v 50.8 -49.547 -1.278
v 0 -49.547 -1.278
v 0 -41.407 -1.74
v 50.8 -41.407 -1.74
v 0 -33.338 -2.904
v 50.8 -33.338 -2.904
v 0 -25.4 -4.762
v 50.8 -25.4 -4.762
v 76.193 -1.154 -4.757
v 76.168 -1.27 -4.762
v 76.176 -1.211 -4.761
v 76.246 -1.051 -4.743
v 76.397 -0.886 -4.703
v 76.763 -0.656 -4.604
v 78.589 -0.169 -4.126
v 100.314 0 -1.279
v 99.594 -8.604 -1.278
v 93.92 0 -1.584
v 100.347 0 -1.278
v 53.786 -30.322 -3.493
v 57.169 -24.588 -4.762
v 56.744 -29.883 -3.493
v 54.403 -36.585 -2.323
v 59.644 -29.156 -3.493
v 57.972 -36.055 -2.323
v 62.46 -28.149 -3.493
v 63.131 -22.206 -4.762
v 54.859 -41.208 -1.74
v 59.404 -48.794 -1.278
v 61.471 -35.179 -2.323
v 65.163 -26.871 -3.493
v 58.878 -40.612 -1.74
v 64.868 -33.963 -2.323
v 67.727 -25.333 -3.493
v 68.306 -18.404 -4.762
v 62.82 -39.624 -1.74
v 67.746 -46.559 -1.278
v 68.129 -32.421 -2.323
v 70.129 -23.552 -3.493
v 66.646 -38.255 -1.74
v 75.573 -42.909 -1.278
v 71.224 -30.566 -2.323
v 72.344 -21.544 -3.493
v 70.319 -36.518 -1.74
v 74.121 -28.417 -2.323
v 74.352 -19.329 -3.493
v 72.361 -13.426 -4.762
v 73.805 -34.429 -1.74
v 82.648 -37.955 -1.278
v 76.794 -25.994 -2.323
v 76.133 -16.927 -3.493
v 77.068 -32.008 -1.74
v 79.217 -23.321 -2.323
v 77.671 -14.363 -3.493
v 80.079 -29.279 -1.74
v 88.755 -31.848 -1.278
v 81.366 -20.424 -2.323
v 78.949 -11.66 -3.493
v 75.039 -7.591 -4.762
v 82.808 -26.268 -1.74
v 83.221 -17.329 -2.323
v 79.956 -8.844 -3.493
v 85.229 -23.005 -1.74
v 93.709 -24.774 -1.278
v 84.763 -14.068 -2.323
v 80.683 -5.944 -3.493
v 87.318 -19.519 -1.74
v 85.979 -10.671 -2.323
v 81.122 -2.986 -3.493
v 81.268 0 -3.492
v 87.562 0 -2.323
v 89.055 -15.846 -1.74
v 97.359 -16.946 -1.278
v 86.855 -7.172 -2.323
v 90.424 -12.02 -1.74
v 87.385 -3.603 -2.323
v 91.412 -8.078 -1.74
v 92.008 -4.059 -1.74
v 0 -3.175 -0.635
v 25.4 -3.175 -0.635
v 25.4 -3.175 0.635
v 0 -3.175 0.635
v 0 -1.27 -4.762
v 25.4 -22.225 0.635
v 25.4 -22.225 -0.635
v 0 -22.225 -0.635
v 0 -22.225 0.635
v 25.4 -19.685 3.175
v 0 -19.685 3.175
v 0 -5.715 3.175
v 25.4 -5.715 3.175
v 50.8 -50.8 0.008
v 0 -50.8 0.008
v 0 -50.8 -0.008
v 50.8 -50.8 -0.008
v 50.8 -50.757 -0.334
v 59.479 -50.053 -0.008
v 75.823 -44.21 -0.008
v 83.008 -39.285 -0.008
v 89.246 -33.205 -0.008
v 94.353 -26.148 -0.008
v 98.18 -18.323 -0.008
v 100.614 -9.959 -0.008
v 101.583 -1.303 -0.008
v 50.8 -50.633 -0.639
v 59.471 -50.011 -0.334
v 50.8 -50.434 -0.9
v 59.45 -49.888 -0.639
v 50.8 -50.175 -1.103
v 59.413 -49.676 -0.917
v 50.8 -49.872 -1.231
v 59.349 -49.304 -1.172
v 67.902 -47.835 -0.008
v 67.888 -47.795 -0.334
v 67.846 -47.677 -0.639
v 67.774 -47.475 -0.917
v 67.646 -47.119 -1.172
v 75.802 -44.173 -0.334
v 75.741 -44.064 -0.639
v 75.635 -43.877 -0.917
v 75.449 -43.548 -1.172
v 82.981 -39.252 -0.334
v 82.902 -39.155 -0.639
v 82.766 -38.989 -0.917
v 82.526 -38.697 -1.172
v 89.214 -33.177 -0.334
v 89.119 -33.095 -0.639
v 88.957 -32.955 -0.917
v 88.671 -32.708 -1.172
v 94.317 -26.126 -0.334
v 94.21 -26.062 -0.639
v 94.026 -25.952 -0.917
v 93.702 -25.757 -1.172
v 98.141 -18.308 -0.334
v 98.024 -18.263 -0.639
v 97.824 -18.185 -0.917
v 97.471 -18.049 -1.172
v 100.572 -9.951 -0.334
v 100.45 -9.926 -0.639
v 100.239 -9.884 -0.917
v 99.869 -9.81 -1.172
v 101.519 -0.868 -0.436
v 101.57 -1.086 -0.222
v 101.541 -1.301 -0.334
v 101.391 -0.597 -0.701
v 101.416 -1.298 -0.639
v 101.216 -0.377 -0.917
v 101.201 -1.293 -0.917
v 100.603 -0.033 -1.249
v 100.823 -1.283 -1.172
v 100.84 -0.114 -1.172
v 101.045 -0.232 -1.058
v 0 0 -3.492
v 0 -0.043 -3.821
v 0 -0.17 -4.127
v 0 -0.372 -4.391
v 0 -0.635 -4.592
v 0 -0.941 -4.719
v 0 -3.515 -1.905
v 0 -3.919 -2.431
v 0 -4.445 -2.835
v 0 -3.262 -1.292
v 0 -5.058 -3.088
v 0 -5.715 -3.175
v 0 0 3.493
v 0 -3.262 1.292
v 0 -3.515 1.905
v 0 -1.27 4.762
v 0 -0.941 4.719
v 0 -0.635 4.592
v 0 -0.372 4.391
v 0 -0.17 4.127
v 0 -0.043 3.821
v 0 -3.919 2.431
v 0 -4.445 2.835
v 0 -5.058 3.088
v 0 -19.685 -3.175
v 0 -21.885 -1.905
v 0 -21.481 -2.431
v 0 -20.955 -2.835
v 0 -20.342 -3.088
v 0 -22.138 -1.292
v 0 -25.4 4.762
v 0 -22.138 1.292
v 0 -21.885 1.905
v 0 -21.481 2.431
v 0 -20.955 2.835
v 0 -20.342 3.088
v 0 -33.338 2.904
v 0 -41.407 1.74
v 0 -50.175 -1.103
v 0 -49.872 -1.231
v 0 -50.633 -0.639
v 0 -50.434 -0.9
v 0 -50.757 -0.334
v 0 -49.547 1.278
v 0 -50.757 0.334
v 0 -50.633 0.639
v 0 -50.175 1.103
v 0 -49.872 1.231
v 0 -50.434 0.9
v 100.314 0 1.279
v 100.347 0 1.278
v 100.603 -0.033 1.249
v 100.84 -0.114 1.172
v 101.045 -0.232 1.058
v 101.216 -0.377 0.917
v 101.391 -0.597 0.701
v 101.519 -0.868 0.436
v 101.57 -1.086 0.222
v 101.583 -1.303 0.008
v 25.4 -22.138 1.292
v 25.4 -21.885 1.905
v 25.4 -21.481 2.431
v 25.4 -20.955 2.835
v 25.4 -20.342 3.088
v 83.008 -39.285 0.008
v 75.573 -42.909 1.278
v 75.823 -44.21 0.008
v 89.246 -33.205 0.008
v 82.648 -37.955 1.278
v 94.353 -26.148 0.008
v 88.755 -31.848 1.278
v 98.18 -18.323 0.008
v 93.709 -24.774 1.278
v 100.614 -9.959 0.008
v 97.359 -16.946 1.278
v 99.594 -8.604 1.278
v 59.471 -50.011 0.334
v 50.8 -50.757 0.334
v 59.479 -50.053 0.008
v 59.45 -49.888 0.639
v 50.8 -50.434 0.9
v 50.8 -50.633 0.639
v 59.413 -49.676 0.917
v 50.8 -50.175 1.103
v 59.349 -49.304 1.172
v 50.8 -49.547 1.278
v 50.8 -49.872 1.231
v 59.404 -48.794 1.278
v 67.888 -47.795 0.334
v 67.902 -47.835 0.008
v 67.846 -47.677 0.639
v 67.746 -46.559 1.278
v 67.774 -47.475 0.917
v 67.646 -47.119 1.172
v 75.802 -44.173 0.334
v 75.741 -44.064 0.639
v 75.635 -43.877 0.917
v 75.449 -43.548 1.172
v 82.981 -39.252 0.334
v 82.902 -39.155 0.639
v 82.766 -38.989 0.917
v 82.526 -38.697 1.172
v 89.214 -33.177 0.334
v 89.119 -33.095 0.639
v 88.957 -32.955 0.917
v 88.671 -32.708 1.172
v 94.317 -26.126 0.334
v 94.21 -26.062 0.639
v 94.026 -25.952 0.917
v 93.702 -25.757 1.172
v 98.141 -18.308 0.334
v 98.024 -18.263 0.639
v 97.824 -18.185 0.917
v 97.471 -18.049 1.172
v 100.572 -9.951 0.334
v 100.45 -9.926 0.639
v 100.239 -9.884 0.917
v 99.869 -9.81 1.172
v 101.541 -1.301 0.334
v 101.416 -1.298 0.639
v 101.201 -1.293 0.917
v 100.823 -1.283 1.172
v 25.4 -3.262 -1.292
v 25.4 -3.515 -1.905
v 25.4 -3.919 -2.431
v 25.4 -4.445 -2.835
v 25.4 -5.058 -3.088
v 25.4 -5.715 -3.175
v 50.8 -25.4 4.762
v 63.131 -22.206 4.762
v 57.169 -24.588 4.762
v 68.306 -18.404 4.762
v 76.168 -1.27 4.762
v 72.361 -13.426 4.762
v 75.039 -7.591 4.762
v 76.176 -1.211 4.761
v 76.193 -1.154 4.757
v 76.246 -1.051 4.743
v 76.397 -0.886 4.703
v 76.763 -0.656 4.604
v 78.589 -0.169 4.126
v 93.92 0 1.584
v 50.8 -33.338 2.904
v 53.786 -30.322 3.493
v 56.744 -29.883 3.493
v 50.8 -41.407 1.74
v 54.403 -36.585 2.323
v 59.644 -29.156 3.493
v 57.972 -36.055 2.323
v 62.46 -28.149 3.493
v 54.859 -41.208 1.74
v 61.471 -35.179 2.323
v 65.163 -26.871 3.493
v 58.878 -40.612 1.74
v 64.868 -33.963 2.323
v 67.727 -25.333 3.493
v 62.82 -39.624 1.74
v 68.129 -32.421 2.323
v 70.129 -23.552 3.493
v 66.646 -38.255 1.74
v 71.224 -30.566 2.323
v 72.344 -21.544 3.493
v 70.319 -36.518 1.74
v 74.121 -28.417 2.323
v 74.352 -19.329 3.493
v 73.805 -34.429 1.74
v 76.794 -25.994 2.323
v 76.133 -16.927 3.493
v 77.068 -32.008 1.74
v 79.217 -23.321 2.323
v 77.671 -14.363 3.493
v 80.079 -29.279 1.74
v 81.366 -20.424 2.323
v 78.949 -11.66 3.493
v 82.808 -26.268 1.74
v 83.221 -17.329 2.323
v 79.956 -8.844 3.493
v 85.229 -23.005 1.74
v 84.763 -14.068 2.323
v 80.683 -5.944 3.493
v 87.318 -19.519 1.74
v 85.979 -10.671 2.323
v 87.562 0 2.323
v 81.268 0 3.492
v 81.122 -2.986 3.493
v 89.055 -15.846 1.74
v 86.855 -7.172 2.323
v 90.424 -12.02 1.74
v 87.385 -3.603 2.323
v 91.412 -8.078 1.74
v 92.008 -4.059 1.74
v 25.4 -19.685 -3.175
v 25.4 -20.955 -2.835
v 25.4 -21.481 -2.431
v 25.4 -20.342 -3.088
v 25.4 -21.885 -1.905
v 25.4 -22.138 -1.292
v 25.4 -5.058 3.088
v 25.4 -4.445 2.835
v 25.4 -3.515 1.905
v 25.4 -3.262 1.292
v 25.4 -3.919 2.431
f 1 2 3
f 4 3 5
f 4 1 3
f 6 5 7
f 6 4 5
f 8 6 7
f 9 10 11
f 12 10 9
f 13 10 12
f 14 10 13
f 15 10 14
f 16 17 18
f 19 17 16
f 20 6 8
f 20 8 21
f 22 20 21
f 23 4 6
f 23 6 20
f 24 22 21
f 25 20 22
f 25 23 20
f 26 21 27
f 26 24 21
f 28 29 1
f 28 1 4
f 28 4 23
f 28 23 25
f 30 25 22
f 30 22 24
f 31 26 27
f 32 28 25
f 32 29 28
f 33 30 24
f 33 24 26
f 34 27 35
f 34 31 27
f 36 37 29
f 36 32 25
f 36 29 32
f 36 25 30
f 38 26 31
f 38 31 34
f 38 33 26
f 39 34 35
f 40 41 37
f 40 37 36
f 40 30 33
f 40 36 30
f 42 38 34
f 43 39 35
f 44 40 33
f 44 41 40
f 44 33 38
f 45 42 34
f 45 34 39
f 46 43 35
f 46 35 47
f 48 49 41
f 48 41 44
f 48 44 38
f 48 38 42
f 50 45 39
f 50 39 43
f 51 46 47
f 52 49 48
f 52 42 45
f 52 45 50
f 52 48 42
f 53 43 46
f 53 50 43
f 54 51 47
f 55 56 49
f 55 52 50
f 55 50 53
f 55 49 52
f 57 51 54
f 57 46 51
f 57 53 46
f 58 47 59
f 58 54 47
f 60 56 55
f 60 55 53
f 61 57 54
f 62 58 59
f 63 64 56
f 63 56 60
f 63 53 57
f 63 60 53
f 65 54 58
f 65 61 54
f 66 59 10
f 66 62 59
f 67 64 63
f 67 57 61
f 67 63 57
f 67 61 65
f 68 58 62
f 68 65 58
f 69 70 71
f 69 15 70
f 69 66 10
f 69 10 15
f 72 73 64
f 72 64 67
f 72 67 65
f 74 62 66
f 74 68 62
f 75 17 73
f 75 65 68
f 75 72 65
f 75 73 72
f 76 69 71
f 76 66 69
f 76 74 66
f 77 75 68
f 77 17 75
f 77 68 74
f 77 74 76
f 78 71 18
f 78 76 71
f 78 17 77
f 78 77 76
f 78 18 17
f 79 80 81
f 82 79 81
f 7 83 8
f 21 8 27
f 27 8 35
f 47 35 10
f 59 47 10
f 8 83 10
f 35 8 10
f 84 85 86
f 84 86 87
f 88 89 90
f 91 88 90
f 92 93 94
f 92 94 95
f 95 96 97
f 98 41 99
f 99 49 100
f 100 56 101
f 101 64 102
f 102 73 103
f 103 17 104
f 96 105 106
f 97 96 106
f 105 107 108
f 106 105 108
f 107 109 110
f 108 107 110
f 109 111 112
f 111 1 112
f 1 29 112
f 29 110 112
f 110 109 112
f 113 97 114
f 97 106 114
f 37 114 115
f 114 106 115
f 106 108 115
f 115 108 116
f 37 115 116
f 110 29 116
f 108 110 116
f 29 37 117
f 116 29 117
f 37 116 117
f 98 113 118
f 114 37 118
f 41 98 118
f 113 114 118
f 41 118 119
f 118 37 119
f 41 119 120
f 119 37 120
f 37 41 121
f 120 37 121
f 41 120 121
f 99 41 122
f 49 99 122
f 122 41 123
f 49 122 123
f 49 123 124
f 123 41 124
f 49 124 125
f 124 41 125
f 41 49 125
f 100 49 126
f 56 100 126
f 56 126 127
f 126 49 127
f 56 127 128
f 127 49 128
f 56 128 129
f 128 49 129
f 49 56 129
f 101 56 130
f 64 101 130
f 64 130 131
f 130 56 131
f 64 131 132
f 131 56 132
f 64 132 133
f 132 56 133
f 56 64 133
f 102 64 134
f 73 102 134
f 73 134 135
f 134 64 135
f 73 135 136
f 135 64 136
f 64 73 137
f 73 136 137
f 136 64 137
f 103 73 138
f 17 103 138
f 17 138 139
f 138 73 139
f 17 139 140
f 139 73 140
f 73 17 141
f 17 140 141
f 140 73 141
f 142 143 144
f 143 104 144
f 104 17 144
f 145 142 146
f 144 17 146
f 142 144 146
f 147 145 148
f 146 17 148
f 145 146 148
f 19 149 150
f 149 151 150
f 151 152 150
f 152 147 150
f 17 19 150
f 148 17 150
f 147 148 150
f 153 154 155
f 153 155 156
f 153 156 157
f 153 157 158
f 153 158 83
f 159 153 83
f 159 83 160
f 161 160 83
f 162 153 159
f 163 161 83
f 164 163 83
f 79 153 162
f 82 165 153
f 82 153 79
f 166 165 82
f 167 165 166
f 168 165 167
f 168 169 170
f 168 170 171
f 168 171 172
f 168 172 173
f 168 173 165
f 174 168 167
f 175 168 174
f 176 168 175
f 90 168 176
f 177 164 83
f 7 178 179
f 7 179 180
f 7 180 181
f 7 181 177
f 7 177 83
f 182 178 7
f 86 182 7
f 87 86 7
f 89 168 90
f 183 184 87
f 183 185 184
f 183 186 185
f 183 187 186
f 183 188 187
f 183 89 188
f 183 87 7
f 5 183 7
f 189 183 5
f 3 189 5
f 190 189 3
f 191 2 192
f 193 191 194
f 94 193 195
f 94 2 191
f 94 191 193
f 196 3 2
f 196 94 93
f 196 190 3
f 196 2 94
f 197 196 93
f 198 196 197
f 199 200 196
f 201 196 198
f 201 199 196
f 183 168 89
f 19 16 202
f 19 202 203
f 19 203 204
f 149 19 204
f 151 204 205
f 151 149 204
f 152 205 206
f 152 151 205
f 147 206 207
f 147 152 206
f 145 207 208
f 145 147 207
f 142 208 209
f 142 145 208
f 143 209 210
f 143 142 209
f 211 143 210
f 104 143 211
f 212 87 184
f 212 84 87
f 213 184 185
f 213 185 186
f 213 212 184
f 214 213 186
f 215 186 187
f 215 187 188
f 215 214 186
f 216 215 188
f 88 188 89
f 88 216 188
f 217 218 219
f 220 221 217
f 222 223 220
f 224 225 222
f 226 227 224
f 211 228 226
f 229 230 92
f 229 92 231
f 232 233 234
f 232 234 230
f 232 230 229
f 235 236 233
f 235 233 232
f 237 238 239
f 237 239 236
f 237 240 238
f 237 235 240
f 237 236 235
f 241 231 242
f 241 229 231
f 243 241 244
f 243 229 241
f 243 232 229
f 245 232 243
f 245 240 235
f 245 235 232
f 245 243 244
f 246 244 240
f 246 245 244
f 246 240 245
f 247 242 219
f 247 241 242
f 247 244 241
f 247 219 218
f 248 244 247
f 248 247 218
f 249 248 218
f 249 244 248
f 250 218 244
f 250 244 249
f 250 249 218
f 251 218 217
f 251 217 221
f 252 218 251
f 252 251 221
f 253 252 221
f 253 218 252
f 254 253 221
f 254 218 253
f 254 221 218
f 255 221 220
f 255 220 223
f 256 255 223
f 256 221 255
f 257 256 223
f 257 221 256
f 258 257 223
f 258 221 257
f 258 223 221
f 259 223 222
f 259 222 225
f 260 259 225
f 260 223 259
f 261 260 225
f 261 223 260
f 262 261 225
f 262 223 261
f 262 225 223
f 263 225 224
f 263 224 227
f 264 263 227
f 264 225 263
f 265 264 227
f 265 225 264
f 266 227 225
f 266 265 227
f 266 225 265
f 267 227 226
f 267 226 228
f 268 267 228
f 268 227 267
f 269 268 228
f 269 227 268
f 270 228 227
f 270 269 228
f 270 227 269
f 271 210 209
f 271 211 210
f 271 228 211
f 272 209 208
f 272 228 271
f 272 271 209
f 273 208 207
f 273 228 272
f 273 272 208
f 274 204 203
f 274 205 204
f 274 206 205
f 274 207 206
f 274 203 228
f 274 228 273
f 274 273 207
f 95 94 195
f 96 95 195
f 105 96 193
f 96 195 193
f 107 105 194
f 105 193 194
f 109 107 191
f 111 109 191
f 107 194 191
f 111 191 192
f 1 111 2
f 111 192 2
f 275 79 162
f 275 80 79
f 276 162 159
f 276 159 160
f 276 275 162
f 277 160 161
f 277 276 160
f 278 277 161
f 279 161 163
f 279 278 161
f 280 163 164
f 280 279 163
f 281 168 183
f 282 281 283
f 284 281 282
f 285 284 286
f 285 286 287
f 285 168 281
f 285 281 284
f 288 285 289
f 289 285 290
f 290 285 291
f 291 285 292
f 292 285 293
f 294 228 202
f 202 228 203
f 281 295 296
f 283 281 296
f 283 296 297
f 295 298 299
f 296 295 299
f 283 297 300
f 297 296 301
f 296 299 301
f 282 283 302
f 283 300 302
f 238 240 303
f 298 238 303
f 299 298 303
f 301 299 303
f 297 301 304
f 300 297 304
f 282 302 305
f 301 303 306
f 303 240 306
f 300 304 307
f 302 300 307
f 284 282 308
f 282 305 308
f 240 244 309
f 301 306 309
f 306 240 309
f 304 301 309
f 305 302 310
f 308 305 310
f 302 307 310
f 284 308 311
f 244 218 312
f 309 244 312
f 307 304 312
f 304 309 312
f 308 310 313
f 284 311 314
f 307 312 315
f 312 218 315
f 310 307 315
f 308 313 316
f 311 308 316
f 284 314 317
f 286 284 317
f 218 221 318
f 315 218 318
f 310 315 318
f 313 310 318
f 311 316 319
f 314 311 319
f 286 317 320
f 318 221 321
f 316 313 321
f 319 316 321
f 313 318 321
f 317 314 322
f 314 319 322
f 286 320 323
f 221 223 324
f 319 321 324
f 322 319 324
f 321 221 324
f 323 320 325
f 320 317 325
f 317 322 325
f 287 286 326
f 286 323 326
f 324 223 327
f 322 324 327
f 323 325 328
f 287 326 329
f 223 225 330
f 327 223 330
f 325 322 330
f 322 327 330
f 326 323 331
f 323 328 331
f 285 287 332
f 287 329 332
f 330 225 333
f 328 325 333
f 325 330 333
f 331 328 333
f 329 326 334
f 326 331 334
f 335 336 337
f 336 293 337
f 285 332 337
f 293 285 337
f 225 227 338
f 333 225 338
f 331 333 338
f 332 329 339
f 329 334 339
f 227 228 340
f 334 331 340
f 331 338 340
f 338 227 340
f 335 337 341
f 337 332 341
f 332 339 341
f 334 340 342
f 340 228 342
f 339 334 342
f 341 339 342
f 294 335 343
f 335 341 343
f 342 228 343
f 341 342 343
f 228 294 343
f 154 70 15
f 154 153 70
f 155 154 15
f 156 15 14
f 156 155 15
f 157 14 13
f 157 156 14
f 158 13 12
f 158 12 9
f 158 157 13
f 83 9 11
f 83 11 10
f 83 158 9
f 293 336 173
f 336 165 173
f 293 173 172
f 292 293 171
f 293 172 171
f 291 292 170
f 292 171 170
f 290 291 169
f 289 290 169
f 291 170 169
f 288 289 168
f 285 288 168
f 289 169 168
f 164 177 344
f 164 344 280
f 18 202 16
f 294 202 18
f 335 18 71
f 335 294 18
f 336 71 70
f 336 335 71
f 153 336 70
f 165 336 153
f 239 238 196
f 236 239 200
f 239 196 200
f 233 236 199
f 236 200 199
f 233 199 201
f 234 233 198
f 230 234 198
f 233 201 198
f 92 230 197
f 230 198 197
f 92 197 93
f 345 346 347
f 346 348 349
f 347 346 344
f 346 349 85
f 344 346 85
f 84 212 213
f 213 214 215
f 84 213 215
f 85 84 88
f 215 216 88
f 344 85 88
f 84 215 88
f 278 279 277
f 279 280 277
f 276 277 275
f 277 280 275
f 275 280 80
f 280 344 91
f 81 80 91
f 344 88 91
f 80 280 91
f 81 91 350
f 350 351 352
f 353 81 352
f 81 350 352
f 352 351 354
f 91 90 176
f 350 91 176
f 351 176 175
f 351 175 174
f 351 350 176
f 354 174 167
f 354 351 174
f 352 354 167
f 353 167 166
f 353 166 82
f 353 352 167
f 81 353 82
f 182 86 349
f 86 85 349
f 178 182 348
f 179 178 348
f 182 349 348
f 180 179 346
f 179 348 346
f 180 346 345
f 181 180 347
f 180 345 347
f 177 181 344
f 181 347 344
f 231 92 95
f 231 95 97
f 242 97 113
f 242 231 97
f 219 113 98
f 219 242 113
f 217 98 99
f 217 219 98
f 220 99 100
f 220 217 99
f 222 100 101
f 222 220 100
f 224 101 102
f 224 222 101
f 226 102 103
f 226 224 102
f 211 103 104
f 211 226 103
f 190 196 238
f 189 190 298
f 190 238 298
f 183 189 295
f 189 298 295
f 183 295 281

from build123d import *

# Parameters (mm, degrees)
F1_DEPTH     = 4.7625
F2_W         = 19.05
F2_H         = 6.35
F3_DEPTH     = 25.4
F4_R         = 2.54
F9_T1_DEPTH  = 9.0533559085
F9_T3_DEPTH  = 84.7725
F9_T5_DEPTH  = 53.9538612207
F9_T8_ANGLE  = 93.5585733653
F9_T10_ANGLE = 93.5585733653


# Not quite as in the source:
# - a fillet or chamfer that OpenCascade refuses, or shapes differently, is made with other operations: its cross-section is extruded or revolved along the edge and cut away or added
# - two fillets or chamfers of one size are made in one step


with BuildPart() as f1:
    # F0 (on Top) → F1 (new body, symmetric)
    with BuildSketch(Plane.XY):
        with BuildLine():
            Line((101.6, 0), (0, 0))
            Line((0, 0), (0, -50.8))
            Line((0, -50.8), (50.8, -50.8))
            ThreePointArc((50.8, -50.8), (86.7210244843, -35.9210244843), (101.6, 0))
        make_face()
    extrude(amount=F1_DEPTH, both=True)

    # F2 (on Right) → F3 (cut)
    with BuildSketch(Plane.YZ):
        with Locations((-12.7, 0)):
            Rectangle(F2_W, F2_H)
    extrude(amount=F3_DEPTH, mode=Mode.SUBTRACT)

    # F4
    f4_edges = [f1.edges().sort_by_distance(p)[0] for p in [
        (12.7, -3.175, -3.175),
        (12.7, -3.175, 3.175),
        (12.7, -22.225, -3.175),
        (12.7, -22.225, 3.175),
    ]]
    fillet(f4_edges, radius=F4_R)


with BuildPart() as f6:
    # F6: sweep along a path in F6_path
    with BuildLine(Plane(origin=(50.8, -50.8, 4.7625), x_dir=(0, 1, 0), z_dir=(0, 0, 1))) as f6_path:
        Line((0, 50.8), (0, 0))
        ThreePointArc((0, 0), (14.8789755157, -35.9210244843), (50.8, -50.8))
    # F5 (on face) → F6 (sweep)
    with BuildSketch(Plane(origin=(0, 0, 0), x_dir=(0, -1, 0), z_dir=(-1, 0, 0))):
        with BuildLine():
            Line((50.8, 4.7625), (25.4, 4.7625))
            ThreePointArc((25.4, 4.7625), (37.9805074569, 2.1472133229), (50.8, 1.27))
            Line((50.8, 1.27), (50.8, 4.7625))
        make_face()
    sweep(path=f6_path.line)


with BuildPart() as f7_1:
    # F7: instance of F6
    add(f6.part.mirror(Plane.XY))


with BuildPart() as f1_1:
    add(f1.part)

    # F8: cut F6, F7_1
    add(f6.part, mode=Mode.SUBTRACT)
    add(f7_1.part, mode=Mode.SUBTRACT)

    # F9: fillet of radius 1.27 on 8 edges, made by hand

    # F9_s2 → F9_t1 (cut)
    with BuildSketch(Plane.XY.offset(-4.5266779542)):
        with BuildLine():
            ThreePointArc((100.3137152716, 0), (101.2231811617, -0.3835623006), (101.5832977145, -1.3025641026))
            ThreePointArc((101.5832977145, -1.3025641026), (101.595824257, -0.6513355908), (101.6, 0))
            Line((101.6, 0), (100.3137152716, 0))
        make_face()
    extrude(amount=F9_T1_DEPTH, mode=Mode.SUBTRACT)

    # F9_s4 → F9_t3 (cut)
    with BuildSketch(Plane.YZ.offset(-3.175)):
        with BuildLine():
            ThreePointArc((0, 3.4925), (-0.3719743879, 4.3905256121), (-1.27, 4.7625))
            Line((-1.27, 4.7625), (0, 4.7625))
            Line((0, 4.7625), (0, 3.4925))
        make_face()
        with BuildLine():
            ThreePointArc((0, -3.4925), (-0.3719743879, -4.3905256121), (-1.27, -4.7625))
            Line((-1.27, -4.7625), (0, -4.7625))
            Line((0, -4.7625), (0, -3.4925))
        make_face()
    extrude(amount=F9_T3_DEPTH, mode=Mode.SUBTRACT)

    # F9_s6 → F9_t5 (cut)
    with BuildSketch(Plane.YZ.offset(-3.1538612207)):
        with BuildLine():
            ThreePointArc((-49.5469102739, 1.2783429251), (-50.4339845264, 0.9004824038), (-50.8, 0.0084555117))
            Line((-50.8, 0.0084555117), (-50.8, 1.27))
            ThreePointArc((-50.8, 1.27), (-50.1734412505, 1.2720857544), (-49.5469102739, 1.2783429251))
        make_face()
        with BuildLine():
            ThreePointArc((-50.8, -0.0084555117), (-50.4339845264, -0.9004824038), (-49.5469102739, -1.2783429251))
            ThreePointArc((-49.5469102739, -1.2783429251), (-50.1734412505, -1.2720857544), (-50.8, -1.27))
            Line((-50.8, -1.27), (-50.8, -0.0084555117))
        make_face()
    extrude(amount=F9_T5_DEPTH, mode=Mode.SUBTRACT)

    # F9_s7 → F9_t8 (revolve, cut)
    with BuildSketch(Plane.YZ.offset(50.8)):
        with BuildLine():
            ThreePointArc((-50.8, 0.0084555117), (-50.4339845264, 0.9004824038), (-49.5469102739, 1.2783429251))
            ThreePointArc((-49.5469102739, 1.2783429251), (-50.1734412505, 1.2720857544), (-50.8, 1.27))
            Line((-50.8, 1.27), (-50.8, 0.0084555117))
        make_face()
    revolve(axis=Axis((50.8, 0, 1.27), (0, 0, 1)), revolution_arc=F9_T8_ANGLE, mode=Mode.SUBTRACT)

    # F9_s9 → F9_t10 (revolve, cut)
    with BuildSketch(Plane.YZ.offset(50.8)):
        with BuildLine():
            ThreePointArc((-50.8, -0.0084555117), (-50.4339845264, -0.9004824038), (-49.5469102739, -1.2783429251))
            ThreePointArc((-49.5469102739, -1.2783429251), (-50.1734412505, -1.2720857544), (-50.8, -1.27))
            Line((-50.8, -1.27), (-50.8, -0.0084555117))
        make_face()
    revolve(axis=Axis((50.8, 0, -1.27), (0, 0, 1)), revolution_arc=F9_T10_ANGLE, mode=Mode.SUBTRACT)


solid = f1_1.part
